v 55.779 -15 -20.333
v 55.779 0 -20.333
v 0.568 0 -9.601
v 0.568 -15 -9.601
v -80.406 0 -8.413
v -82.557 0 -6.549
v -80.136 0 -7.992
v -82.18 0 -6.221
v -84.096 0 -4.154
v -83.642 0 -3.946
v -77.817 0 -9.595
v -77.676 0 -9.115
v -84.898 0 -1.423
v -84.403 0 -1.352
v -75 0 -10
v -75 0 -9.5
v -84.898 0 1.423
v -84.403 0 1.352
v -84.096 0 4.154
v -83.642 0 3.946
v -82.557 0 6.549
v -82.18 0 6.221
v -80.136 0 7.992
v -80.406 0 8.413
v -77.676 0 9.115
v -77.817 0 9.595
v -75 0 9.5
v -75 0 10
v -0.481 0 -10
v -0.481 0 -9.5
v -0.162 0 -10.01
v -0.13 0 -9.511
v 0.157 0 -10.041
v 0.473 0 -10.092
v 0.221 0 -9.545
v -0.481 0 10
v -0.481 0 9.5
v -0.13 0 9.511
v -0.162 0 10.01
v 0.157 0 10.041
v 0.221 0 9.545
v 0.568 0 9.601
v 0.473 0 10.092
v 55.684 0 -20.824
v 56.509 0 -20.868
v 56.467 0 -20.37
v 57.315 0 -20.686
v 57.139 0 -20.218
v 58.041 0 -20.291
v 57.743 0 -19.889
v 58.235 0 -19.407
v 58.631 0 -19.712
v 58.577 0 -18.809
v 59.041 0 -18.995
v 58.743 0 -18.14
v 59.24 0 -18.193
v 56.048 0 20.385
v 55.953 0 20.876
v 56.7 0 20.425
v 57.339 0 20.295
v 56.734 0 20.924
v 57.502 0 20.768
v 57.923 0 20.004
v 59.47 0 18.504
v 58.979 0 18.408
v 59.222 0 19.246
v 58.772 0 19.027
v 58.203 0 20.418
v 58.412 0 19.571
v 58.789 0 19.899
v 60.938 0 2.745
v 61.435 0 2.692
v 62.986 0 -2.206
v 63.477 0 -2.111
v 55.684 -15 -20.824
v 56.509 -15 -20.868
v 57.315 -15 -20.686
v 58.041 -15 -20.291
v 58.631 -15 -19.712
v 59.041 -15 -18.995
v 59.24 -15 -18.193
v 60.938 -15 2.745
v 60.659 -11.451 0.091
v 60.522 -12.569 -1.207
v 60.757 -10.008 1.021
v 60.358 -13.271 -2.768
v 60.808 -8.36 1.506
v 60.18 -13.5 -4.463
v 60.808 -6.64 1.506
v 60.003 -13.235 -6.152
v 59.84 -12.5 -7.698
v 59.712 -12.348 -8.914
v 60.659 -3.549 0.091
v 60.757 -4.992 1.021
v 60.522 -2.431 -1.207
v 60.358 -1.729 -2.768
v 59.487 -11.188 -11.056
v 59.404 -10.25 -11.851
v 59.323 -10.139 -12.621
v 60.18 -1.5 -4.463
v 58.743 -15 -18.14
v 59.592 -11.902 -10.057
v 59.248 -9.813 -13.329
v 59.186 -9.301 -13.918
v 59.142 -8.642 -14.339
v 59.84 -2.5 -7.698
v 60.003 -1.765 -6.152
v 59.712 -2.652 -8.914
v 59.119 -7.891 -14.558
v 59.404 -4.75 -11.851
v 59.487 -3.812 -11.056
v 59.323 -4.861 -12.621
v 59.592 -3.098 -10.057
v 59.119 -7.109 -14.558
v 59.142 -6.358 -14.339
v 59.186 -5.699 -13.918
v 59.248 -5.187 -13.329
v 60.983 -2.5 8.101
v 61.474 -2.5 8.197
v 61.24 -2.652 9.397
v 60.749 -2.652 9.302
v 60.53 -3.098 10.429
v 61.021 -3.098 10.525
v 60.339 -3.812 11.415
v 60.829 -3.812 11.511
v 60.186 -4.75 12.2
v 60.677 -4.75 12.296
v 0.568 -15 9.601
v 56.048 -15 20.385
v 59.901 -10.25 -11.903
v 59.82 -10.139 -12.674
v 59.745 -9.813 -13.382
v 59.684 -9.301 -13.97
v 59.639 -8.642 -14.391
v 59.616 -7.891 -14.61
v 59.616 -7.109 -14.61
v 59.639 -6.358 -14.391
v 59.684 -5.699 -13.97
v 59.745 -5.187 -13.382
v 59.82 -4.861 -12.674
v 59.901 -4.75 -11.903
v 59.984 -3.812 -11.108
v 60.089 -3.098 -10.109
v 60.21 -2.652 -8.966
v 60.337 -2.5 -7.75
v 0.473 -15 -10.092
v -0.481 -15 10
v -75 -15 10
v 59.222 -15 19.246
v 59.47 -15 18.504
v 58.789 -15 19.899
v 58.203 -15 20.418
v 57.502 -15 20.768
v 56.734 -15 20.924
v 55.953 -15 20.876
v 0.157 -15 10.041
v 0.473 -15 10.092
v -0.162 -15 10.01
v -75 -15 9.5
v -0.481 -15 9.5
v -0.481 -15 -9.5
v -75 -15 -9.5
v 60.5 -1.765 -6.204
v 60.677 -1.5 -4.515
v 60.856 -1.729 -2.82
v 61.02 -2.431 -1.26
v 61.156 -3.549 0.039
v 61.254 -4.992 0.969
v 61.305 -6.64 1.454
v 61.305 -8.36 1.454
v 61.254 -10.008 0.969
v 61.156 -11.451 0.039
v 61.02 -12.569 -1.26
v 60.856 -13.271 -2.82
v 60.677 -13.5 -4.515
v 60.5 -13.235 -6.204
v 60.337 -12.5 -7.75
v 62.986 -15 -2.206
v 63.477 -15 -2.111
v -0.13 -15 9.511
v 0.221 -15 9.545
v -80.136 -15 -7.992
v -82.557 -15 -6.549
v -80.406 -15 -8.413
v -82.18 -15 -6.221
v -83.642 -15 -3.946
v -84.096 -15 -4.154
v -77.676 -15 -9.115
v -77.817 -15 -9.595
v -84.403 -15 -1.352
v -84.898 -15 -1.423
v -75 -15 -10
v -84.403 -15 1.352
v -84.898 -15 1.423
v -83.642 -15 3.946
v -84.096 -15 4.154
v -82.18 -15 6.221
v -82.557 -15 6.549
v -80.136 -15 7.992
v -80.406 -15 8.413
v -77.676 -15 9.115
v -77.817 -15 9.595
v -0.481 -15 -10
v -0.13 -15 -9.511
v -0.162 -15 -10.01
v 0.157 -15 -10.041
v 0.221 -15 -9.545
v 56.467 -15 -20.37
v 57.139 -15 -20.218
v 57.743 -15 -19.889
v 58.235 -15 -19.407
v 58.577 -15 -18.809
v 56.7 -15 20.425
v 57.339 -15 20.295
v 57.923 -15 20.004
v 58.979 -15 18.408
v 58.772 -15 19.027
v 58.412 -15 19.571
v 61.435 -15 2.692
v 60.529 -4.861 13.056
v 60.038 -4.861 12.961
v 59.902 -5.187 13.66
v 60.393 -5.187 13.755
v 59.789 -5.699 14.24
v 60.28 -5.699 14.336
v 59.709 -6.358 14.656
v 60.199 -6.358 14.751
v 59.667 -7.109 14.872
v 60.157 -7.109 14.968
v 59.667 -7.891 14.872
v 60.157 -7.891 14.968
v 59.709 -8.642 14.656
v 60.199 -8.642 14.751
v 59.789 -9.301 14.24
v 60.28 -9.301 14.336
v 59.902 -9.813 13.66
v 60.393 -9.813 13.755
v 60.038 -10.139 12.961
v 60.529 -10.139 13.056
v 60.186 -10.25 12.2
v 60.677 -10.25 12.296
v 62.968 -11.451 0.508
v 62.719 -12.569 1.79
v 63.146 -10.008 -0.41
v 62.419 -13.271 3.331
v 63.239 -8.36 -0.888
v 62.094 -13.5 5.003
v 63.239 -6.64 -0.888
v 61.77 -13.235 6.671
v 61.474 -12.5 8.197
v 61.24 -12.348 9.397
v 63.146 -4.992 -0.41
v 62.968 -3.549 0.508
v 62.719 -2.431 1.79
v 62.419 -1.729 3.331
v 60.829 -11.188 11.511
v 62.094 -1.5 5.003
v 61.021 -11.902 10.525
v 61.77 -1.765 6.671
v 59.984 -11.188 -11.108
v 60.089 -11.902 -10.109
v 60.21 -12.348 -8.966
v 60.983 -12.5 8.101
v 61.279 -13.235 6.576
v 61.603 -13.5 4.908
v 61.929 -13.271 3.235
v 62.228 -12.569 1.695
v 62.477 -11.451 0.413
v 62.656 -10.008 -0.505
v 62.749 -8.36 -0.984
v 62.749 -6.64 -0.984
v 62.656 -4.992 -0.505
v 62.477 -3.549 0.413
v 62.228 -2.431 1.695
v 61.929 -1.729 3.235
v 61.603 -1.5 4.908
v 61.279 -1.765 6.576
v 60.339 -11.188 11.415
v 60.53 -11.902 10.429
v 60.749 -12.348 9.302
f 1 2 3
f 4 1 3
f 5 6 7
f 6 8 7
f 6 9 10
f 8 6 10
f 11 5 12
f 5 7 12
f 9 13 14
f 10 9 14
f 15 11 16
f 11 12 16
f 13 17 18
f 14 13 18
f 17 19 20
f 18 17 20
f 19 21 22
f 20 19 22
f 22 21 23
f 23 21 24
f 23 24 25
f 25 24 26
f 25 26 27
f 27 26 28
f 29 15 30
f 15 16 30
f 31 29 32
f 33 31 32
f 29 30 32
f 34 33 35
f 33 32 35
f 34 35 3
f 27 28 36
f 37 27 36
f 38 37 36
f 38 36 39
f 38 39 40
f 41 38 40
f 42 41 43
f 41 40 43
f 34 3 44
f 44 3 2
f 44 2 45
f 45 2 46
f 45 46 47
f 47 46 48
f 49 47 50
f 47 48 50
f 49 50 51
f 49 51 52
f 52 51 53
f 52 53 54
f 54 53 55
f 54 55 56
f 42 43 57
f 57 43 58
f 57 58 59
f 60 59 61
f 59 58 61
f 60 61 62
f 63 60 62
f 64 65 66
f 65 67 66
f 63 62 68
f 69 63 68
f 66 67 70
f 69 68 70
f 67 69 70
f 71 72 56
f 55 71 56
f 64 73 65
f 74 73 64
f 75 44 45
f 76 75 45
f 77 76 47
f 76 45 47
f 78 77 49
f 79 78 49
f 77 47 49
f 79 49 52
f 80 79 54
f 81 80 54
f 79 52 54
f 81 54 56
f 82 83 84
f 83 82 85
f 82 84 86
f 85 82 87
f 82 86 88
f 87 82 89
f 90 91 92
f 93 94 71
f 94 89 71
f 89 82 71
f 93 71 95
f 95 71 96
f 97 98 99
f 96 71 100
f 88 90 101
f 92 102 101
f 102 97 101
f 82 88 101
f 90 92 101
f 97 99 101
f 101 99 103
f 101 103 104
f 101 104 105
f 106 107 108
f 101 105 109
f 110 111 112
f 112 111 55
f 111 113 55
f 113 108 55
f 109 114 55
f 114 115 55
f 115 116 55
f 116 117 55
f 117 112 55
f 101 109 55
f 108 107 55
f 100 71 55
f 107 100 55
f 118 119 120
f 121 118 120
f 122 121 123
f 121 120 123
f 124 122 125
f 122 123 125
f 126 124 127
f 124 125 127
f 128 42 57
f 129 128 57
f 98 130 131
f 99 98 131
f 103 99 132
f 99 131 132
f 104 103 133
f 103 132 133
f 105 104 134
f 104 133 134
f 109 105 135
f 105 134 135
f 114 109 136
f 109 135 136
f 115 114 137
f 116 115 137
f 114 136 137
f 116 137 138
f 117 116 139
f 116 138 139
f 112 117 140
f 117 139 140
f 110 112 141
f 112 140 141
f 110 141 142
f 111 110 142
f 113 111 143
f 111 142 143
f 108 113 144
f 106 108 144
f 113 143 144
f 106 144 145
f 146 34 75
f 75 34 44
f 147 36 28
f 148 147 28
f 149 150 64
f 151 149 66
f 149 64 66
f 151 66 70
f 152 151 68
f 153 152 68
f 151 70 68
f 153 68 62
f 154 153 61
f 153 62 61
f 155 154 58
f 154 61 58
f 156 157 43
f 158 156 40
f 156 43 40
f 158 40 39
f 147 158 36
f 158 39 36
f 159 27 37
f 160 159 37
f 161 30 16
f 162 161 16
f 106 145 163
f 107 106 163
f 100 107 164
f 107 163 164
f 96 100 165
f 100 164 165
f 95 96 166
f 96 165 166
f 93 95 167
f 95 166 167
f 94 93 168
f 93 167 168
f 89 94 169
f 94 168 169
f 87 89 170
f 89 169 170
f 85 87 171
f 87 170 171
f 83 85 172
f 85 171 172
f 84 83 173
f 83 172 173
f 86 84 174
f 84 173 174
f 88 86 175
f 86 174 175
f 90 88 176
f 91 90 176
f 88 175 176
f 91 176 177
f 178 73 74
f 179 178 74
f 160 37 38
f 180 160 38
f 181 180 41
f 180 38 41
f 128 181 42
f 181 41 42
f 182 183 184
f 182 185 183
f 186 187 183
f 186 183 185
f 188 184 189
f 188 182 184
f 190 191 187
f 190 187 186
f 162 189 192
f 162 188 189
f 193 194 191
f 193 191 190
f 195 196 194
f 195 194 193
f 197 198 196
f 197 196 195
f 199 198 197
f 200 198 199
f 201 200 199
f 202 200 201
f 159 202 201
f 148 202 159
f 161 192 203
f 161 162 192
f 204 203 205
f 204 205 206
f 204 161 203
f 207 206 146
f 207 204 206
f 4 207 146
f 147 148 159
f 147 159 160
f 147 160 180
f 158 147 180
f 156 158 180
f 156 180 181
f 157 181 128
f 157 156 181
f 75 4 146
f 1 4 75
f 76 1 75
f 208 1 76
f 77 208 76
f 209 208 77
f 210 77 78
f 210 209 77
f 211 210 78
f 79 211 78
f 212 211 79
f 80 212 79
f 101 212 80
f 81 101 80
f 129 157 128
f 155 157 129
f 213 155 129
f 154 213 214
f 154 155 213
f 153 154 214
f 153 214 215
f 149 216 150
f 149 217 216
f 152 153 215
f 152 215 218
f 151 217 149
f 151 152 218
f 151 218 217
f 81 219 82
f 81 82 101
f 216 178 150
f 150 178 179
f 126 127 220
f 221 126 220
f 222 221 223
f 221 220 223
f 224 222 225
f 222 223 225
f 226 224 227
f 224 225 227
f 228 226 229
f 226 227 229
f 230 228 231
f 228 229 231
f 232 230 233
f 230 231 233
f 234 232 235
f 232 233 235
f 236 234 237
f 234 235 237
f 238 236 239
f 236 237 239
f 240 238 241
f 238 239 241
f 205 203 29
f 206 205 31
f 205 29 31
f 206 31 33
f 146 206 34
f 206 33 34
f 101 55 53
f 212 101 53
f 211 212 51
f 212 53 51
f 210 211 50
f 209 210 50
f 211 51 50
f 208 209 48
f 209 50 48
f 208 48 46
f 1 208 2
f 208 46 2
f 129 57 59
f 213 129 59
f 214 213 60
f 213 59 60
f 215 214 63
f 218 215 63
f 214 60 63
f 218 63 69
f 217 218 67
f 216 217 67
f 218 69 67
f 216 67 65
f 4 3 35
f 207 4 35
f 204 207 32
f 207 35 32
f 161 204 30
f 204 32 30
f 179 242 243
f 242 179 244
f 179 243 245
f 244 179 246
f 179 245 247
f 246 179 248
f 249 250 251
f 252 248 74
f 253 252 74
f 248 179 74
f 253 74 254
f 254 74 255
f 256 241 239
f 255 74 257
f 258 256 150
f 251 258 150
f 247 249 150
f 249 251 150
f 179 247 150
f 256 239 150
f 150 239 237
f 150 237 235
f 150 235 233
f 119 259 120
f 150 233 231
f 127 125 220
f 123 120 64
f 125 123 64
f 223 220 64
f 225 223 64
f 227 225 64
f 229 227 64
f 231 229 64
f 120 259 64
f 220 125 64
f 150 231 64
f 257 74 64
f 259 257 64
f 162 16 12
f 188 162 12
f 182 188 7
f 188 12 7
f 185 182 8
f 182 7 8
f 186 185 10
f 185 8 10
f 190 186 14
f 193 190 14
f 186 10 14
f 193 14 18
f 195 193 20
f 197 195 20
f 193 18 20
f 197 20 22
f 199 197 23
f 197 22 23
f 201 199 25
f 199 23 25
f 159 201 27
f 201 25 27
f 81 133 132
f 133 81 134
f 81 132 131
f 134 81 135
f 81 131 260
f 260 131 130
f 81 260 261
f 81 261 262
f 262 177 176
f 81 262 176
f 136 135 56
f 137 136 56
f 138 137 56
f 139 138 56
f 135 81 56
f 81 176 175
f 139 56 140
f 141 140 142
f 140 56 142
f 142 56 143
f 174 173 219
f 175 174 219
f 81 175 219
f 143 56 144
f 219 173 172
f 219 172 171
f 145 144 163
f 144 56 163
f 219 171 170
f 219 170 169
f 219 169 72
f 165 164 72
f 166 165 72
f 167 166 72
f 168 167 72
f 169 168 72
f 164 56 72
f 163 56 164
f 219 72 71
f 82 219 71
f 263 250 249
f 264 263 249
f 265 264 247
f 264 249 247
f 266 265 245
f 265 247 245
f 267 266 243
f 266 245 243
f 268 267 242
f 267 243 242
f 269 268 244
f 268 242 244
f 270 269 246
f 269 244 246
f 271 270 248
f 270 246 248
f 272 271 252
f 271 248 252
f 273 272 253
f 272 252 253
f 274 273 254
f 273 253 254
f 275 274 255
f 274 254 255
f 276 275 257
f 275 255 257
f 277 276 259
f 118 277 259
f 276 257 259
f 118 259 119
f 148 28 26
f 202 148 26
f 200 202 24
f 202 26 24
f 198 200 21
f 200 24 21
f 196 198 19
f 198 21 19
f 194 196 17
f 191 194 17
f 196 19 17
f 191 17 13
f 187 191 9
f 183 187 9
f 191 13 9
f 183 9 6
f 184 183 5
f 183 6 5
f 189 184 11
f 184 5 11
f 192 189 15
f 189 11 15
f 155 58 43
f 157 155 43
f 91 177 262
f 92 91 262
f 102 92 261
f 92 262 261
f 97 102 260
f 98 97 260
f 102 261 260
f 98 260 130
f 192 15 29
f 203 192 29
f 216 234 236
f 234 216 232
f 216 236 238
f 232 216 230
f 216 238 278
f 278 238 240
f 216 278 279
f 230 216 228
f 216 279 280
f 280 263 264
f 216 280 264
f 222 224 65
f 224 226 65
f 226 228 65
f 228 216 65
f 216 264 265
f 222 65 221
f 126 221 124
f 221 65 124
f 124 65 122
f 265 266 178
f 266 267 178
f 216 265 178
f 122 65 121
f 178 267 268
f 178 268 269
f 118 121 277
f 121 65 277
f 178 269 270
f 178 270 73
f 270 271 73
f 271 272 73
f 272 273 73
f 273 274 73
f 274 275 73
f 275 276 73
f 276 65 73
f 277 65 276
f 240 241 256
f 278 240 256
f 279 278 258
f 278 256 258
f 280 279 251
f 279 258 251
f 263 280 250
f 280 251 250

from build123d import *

# Parameters (mm, degrees)
F1_DEPTH = 15
F3_DEPTH = 0.5
F5_DEPTH = 1


with BuildPart() as f1:
    # F0 (on Front) → F1 (new body)
    with BuildSketch(Plane.XZ):
        with BuildLine():
            Line((-0.481445241, 10), (-75, 10))
            ThreePointArc((-75, 10), (-85, 0), (-75, -10))
            Line((-75, -10), (-0.481445241, -10))
            ThreePointArc((-0.481445241, -10), (-0.0022164784, -10.0230190082), (0.4725997359, -10.0918640828))
            Line((0.4725997359, -10.0918640828), (55.6838567363, -20.8238452864))
            ThreePointArc((55.6838567363, -20.8238452864), (58.0407520827, -20.2905343179), (59.2398494086, -18.1925491258))
            Line((59.2398494086, -18.1925491258), (61.4349471372, 2.6924106769))
            Line((61.4349471372, 2.6924106769), (60.9376861895, 2.7446749085))
            Line((60.9376861895, 2.7446749085), (58.7425884609, -18.1402848942))
            ThreePointArc((58.7425884609, -18.1402848942), (57.7433406893, -19.8886058876), (55.779261234, -20.3330316947))
            Line((55.779261234, -20.3330316947), (0.5680042336, -9.601050491))
            ThreePointArc((0.5680042336, -9.601050491), (0.0457063979, -9.525320909), (-0.481445241, -9.5))
            Line((-0.481445241, -9.5), (-75, -9.5))
            ThreePointArc((-75, -9.5), (-84.5, 0), (-75, 9.5))
            Line((-75, 9.5), (-0.481445241, 9.5))
            ThreePointArc((-0.481445241, 9.5), (0.0457063979, 9.525320909), (0.5680042336, 9.601050491))
            Line((0.5680042336, 9.601050491), (56.0481539542, 20.3852991447))
            ThreePointArc((56.0481539542, 20.3852991447), (57.9231587013, 20.0038251175), (58.9792444013, 18.4082536746))
            Line((58.9792444013, 18.4082536746), (62.9862333042, -2.2059171778))
            Line((62.9862333042, -2.2059171778), (63.4770468959, -2.1105126802))
            Line((63.4770468959, -2.1105126802), (59.470057993, 18.5036581722))
            ThreePointArc((59.470057993, 18.5036581722), (58.2027551531, 20.4183439038), (55.9527494565, 20.8761127365))
            Line((55.9527494565, 20.8761127365), (0.4725997359, 10.0918640828))
            ThreePointArc((0.4725997359, 10.0918640828), (-0.0022164784, 10.0230190082), (-0.481445241, 10))
        make_face()
    extrude(amount=F1_DEPTH)

    # F2 (on face) → F3 (cut)
    with BuildSketch(Plane(origin=(60.7706639739, 0, 11.8126204498), x_dir=(0, 1, 0), z_dir=(0.9816271834, 0, 0.1908089954))):
        with BuildLine():
            ThreePointArc((-4.75, 0.4920951066), (-7.5, 3.2420951066), (-10.25, 0.4920951066))
            ThreePointArc((-10.25, 0.4920951066), (-11.9017042154, -1.3120199204), (-12.5, -3.6837281655))
            ThreePointArc((-12.5, -3.6837281655), (-7.5, -13.0003529559), (-2.5, -3.6837281655))
            ThreePointArc((-2.5, -3.6837281655), (-3.0982957846, -1.3120199204), (-4.75, 0.4920951066))
        make_face()
    extrude(amount=-F3_DEPTH, mode=Mode.SUBTRACT)

    # F4 (on face) → F5 (cut)
    with BuildSketch(Plane(origin=(60.4838048122, 0, -6.3571040507), x_dir=(0, 1, 0), z_dir=(0.9945218954, 0, -0.1045284633))):
        with BuildLine():
            ThreePointArc((-2.5, -1.4006380153), (-7.5, 7.915986775), (-12.5, -1.4006380153))
            ThreePointArc((-12.5, -1.4006380153), (-11.9017042154, -3.7723462605), (-10.25, -5.5764612875))
            ThreePointArc((-10.25, -5.5764612875), (-7.5, -8.3264612875), (-4.75, -5.5764612875))
            ThreePointArc((-4.75, -5.5764612875), (-3.0982957846, -3.7723462605), (-2.5, -1.4006380153))
        make_face()
    extrude(amount=-F5_DEPTH, mode=Mode.SUBTRACT)


solid = f1.part
